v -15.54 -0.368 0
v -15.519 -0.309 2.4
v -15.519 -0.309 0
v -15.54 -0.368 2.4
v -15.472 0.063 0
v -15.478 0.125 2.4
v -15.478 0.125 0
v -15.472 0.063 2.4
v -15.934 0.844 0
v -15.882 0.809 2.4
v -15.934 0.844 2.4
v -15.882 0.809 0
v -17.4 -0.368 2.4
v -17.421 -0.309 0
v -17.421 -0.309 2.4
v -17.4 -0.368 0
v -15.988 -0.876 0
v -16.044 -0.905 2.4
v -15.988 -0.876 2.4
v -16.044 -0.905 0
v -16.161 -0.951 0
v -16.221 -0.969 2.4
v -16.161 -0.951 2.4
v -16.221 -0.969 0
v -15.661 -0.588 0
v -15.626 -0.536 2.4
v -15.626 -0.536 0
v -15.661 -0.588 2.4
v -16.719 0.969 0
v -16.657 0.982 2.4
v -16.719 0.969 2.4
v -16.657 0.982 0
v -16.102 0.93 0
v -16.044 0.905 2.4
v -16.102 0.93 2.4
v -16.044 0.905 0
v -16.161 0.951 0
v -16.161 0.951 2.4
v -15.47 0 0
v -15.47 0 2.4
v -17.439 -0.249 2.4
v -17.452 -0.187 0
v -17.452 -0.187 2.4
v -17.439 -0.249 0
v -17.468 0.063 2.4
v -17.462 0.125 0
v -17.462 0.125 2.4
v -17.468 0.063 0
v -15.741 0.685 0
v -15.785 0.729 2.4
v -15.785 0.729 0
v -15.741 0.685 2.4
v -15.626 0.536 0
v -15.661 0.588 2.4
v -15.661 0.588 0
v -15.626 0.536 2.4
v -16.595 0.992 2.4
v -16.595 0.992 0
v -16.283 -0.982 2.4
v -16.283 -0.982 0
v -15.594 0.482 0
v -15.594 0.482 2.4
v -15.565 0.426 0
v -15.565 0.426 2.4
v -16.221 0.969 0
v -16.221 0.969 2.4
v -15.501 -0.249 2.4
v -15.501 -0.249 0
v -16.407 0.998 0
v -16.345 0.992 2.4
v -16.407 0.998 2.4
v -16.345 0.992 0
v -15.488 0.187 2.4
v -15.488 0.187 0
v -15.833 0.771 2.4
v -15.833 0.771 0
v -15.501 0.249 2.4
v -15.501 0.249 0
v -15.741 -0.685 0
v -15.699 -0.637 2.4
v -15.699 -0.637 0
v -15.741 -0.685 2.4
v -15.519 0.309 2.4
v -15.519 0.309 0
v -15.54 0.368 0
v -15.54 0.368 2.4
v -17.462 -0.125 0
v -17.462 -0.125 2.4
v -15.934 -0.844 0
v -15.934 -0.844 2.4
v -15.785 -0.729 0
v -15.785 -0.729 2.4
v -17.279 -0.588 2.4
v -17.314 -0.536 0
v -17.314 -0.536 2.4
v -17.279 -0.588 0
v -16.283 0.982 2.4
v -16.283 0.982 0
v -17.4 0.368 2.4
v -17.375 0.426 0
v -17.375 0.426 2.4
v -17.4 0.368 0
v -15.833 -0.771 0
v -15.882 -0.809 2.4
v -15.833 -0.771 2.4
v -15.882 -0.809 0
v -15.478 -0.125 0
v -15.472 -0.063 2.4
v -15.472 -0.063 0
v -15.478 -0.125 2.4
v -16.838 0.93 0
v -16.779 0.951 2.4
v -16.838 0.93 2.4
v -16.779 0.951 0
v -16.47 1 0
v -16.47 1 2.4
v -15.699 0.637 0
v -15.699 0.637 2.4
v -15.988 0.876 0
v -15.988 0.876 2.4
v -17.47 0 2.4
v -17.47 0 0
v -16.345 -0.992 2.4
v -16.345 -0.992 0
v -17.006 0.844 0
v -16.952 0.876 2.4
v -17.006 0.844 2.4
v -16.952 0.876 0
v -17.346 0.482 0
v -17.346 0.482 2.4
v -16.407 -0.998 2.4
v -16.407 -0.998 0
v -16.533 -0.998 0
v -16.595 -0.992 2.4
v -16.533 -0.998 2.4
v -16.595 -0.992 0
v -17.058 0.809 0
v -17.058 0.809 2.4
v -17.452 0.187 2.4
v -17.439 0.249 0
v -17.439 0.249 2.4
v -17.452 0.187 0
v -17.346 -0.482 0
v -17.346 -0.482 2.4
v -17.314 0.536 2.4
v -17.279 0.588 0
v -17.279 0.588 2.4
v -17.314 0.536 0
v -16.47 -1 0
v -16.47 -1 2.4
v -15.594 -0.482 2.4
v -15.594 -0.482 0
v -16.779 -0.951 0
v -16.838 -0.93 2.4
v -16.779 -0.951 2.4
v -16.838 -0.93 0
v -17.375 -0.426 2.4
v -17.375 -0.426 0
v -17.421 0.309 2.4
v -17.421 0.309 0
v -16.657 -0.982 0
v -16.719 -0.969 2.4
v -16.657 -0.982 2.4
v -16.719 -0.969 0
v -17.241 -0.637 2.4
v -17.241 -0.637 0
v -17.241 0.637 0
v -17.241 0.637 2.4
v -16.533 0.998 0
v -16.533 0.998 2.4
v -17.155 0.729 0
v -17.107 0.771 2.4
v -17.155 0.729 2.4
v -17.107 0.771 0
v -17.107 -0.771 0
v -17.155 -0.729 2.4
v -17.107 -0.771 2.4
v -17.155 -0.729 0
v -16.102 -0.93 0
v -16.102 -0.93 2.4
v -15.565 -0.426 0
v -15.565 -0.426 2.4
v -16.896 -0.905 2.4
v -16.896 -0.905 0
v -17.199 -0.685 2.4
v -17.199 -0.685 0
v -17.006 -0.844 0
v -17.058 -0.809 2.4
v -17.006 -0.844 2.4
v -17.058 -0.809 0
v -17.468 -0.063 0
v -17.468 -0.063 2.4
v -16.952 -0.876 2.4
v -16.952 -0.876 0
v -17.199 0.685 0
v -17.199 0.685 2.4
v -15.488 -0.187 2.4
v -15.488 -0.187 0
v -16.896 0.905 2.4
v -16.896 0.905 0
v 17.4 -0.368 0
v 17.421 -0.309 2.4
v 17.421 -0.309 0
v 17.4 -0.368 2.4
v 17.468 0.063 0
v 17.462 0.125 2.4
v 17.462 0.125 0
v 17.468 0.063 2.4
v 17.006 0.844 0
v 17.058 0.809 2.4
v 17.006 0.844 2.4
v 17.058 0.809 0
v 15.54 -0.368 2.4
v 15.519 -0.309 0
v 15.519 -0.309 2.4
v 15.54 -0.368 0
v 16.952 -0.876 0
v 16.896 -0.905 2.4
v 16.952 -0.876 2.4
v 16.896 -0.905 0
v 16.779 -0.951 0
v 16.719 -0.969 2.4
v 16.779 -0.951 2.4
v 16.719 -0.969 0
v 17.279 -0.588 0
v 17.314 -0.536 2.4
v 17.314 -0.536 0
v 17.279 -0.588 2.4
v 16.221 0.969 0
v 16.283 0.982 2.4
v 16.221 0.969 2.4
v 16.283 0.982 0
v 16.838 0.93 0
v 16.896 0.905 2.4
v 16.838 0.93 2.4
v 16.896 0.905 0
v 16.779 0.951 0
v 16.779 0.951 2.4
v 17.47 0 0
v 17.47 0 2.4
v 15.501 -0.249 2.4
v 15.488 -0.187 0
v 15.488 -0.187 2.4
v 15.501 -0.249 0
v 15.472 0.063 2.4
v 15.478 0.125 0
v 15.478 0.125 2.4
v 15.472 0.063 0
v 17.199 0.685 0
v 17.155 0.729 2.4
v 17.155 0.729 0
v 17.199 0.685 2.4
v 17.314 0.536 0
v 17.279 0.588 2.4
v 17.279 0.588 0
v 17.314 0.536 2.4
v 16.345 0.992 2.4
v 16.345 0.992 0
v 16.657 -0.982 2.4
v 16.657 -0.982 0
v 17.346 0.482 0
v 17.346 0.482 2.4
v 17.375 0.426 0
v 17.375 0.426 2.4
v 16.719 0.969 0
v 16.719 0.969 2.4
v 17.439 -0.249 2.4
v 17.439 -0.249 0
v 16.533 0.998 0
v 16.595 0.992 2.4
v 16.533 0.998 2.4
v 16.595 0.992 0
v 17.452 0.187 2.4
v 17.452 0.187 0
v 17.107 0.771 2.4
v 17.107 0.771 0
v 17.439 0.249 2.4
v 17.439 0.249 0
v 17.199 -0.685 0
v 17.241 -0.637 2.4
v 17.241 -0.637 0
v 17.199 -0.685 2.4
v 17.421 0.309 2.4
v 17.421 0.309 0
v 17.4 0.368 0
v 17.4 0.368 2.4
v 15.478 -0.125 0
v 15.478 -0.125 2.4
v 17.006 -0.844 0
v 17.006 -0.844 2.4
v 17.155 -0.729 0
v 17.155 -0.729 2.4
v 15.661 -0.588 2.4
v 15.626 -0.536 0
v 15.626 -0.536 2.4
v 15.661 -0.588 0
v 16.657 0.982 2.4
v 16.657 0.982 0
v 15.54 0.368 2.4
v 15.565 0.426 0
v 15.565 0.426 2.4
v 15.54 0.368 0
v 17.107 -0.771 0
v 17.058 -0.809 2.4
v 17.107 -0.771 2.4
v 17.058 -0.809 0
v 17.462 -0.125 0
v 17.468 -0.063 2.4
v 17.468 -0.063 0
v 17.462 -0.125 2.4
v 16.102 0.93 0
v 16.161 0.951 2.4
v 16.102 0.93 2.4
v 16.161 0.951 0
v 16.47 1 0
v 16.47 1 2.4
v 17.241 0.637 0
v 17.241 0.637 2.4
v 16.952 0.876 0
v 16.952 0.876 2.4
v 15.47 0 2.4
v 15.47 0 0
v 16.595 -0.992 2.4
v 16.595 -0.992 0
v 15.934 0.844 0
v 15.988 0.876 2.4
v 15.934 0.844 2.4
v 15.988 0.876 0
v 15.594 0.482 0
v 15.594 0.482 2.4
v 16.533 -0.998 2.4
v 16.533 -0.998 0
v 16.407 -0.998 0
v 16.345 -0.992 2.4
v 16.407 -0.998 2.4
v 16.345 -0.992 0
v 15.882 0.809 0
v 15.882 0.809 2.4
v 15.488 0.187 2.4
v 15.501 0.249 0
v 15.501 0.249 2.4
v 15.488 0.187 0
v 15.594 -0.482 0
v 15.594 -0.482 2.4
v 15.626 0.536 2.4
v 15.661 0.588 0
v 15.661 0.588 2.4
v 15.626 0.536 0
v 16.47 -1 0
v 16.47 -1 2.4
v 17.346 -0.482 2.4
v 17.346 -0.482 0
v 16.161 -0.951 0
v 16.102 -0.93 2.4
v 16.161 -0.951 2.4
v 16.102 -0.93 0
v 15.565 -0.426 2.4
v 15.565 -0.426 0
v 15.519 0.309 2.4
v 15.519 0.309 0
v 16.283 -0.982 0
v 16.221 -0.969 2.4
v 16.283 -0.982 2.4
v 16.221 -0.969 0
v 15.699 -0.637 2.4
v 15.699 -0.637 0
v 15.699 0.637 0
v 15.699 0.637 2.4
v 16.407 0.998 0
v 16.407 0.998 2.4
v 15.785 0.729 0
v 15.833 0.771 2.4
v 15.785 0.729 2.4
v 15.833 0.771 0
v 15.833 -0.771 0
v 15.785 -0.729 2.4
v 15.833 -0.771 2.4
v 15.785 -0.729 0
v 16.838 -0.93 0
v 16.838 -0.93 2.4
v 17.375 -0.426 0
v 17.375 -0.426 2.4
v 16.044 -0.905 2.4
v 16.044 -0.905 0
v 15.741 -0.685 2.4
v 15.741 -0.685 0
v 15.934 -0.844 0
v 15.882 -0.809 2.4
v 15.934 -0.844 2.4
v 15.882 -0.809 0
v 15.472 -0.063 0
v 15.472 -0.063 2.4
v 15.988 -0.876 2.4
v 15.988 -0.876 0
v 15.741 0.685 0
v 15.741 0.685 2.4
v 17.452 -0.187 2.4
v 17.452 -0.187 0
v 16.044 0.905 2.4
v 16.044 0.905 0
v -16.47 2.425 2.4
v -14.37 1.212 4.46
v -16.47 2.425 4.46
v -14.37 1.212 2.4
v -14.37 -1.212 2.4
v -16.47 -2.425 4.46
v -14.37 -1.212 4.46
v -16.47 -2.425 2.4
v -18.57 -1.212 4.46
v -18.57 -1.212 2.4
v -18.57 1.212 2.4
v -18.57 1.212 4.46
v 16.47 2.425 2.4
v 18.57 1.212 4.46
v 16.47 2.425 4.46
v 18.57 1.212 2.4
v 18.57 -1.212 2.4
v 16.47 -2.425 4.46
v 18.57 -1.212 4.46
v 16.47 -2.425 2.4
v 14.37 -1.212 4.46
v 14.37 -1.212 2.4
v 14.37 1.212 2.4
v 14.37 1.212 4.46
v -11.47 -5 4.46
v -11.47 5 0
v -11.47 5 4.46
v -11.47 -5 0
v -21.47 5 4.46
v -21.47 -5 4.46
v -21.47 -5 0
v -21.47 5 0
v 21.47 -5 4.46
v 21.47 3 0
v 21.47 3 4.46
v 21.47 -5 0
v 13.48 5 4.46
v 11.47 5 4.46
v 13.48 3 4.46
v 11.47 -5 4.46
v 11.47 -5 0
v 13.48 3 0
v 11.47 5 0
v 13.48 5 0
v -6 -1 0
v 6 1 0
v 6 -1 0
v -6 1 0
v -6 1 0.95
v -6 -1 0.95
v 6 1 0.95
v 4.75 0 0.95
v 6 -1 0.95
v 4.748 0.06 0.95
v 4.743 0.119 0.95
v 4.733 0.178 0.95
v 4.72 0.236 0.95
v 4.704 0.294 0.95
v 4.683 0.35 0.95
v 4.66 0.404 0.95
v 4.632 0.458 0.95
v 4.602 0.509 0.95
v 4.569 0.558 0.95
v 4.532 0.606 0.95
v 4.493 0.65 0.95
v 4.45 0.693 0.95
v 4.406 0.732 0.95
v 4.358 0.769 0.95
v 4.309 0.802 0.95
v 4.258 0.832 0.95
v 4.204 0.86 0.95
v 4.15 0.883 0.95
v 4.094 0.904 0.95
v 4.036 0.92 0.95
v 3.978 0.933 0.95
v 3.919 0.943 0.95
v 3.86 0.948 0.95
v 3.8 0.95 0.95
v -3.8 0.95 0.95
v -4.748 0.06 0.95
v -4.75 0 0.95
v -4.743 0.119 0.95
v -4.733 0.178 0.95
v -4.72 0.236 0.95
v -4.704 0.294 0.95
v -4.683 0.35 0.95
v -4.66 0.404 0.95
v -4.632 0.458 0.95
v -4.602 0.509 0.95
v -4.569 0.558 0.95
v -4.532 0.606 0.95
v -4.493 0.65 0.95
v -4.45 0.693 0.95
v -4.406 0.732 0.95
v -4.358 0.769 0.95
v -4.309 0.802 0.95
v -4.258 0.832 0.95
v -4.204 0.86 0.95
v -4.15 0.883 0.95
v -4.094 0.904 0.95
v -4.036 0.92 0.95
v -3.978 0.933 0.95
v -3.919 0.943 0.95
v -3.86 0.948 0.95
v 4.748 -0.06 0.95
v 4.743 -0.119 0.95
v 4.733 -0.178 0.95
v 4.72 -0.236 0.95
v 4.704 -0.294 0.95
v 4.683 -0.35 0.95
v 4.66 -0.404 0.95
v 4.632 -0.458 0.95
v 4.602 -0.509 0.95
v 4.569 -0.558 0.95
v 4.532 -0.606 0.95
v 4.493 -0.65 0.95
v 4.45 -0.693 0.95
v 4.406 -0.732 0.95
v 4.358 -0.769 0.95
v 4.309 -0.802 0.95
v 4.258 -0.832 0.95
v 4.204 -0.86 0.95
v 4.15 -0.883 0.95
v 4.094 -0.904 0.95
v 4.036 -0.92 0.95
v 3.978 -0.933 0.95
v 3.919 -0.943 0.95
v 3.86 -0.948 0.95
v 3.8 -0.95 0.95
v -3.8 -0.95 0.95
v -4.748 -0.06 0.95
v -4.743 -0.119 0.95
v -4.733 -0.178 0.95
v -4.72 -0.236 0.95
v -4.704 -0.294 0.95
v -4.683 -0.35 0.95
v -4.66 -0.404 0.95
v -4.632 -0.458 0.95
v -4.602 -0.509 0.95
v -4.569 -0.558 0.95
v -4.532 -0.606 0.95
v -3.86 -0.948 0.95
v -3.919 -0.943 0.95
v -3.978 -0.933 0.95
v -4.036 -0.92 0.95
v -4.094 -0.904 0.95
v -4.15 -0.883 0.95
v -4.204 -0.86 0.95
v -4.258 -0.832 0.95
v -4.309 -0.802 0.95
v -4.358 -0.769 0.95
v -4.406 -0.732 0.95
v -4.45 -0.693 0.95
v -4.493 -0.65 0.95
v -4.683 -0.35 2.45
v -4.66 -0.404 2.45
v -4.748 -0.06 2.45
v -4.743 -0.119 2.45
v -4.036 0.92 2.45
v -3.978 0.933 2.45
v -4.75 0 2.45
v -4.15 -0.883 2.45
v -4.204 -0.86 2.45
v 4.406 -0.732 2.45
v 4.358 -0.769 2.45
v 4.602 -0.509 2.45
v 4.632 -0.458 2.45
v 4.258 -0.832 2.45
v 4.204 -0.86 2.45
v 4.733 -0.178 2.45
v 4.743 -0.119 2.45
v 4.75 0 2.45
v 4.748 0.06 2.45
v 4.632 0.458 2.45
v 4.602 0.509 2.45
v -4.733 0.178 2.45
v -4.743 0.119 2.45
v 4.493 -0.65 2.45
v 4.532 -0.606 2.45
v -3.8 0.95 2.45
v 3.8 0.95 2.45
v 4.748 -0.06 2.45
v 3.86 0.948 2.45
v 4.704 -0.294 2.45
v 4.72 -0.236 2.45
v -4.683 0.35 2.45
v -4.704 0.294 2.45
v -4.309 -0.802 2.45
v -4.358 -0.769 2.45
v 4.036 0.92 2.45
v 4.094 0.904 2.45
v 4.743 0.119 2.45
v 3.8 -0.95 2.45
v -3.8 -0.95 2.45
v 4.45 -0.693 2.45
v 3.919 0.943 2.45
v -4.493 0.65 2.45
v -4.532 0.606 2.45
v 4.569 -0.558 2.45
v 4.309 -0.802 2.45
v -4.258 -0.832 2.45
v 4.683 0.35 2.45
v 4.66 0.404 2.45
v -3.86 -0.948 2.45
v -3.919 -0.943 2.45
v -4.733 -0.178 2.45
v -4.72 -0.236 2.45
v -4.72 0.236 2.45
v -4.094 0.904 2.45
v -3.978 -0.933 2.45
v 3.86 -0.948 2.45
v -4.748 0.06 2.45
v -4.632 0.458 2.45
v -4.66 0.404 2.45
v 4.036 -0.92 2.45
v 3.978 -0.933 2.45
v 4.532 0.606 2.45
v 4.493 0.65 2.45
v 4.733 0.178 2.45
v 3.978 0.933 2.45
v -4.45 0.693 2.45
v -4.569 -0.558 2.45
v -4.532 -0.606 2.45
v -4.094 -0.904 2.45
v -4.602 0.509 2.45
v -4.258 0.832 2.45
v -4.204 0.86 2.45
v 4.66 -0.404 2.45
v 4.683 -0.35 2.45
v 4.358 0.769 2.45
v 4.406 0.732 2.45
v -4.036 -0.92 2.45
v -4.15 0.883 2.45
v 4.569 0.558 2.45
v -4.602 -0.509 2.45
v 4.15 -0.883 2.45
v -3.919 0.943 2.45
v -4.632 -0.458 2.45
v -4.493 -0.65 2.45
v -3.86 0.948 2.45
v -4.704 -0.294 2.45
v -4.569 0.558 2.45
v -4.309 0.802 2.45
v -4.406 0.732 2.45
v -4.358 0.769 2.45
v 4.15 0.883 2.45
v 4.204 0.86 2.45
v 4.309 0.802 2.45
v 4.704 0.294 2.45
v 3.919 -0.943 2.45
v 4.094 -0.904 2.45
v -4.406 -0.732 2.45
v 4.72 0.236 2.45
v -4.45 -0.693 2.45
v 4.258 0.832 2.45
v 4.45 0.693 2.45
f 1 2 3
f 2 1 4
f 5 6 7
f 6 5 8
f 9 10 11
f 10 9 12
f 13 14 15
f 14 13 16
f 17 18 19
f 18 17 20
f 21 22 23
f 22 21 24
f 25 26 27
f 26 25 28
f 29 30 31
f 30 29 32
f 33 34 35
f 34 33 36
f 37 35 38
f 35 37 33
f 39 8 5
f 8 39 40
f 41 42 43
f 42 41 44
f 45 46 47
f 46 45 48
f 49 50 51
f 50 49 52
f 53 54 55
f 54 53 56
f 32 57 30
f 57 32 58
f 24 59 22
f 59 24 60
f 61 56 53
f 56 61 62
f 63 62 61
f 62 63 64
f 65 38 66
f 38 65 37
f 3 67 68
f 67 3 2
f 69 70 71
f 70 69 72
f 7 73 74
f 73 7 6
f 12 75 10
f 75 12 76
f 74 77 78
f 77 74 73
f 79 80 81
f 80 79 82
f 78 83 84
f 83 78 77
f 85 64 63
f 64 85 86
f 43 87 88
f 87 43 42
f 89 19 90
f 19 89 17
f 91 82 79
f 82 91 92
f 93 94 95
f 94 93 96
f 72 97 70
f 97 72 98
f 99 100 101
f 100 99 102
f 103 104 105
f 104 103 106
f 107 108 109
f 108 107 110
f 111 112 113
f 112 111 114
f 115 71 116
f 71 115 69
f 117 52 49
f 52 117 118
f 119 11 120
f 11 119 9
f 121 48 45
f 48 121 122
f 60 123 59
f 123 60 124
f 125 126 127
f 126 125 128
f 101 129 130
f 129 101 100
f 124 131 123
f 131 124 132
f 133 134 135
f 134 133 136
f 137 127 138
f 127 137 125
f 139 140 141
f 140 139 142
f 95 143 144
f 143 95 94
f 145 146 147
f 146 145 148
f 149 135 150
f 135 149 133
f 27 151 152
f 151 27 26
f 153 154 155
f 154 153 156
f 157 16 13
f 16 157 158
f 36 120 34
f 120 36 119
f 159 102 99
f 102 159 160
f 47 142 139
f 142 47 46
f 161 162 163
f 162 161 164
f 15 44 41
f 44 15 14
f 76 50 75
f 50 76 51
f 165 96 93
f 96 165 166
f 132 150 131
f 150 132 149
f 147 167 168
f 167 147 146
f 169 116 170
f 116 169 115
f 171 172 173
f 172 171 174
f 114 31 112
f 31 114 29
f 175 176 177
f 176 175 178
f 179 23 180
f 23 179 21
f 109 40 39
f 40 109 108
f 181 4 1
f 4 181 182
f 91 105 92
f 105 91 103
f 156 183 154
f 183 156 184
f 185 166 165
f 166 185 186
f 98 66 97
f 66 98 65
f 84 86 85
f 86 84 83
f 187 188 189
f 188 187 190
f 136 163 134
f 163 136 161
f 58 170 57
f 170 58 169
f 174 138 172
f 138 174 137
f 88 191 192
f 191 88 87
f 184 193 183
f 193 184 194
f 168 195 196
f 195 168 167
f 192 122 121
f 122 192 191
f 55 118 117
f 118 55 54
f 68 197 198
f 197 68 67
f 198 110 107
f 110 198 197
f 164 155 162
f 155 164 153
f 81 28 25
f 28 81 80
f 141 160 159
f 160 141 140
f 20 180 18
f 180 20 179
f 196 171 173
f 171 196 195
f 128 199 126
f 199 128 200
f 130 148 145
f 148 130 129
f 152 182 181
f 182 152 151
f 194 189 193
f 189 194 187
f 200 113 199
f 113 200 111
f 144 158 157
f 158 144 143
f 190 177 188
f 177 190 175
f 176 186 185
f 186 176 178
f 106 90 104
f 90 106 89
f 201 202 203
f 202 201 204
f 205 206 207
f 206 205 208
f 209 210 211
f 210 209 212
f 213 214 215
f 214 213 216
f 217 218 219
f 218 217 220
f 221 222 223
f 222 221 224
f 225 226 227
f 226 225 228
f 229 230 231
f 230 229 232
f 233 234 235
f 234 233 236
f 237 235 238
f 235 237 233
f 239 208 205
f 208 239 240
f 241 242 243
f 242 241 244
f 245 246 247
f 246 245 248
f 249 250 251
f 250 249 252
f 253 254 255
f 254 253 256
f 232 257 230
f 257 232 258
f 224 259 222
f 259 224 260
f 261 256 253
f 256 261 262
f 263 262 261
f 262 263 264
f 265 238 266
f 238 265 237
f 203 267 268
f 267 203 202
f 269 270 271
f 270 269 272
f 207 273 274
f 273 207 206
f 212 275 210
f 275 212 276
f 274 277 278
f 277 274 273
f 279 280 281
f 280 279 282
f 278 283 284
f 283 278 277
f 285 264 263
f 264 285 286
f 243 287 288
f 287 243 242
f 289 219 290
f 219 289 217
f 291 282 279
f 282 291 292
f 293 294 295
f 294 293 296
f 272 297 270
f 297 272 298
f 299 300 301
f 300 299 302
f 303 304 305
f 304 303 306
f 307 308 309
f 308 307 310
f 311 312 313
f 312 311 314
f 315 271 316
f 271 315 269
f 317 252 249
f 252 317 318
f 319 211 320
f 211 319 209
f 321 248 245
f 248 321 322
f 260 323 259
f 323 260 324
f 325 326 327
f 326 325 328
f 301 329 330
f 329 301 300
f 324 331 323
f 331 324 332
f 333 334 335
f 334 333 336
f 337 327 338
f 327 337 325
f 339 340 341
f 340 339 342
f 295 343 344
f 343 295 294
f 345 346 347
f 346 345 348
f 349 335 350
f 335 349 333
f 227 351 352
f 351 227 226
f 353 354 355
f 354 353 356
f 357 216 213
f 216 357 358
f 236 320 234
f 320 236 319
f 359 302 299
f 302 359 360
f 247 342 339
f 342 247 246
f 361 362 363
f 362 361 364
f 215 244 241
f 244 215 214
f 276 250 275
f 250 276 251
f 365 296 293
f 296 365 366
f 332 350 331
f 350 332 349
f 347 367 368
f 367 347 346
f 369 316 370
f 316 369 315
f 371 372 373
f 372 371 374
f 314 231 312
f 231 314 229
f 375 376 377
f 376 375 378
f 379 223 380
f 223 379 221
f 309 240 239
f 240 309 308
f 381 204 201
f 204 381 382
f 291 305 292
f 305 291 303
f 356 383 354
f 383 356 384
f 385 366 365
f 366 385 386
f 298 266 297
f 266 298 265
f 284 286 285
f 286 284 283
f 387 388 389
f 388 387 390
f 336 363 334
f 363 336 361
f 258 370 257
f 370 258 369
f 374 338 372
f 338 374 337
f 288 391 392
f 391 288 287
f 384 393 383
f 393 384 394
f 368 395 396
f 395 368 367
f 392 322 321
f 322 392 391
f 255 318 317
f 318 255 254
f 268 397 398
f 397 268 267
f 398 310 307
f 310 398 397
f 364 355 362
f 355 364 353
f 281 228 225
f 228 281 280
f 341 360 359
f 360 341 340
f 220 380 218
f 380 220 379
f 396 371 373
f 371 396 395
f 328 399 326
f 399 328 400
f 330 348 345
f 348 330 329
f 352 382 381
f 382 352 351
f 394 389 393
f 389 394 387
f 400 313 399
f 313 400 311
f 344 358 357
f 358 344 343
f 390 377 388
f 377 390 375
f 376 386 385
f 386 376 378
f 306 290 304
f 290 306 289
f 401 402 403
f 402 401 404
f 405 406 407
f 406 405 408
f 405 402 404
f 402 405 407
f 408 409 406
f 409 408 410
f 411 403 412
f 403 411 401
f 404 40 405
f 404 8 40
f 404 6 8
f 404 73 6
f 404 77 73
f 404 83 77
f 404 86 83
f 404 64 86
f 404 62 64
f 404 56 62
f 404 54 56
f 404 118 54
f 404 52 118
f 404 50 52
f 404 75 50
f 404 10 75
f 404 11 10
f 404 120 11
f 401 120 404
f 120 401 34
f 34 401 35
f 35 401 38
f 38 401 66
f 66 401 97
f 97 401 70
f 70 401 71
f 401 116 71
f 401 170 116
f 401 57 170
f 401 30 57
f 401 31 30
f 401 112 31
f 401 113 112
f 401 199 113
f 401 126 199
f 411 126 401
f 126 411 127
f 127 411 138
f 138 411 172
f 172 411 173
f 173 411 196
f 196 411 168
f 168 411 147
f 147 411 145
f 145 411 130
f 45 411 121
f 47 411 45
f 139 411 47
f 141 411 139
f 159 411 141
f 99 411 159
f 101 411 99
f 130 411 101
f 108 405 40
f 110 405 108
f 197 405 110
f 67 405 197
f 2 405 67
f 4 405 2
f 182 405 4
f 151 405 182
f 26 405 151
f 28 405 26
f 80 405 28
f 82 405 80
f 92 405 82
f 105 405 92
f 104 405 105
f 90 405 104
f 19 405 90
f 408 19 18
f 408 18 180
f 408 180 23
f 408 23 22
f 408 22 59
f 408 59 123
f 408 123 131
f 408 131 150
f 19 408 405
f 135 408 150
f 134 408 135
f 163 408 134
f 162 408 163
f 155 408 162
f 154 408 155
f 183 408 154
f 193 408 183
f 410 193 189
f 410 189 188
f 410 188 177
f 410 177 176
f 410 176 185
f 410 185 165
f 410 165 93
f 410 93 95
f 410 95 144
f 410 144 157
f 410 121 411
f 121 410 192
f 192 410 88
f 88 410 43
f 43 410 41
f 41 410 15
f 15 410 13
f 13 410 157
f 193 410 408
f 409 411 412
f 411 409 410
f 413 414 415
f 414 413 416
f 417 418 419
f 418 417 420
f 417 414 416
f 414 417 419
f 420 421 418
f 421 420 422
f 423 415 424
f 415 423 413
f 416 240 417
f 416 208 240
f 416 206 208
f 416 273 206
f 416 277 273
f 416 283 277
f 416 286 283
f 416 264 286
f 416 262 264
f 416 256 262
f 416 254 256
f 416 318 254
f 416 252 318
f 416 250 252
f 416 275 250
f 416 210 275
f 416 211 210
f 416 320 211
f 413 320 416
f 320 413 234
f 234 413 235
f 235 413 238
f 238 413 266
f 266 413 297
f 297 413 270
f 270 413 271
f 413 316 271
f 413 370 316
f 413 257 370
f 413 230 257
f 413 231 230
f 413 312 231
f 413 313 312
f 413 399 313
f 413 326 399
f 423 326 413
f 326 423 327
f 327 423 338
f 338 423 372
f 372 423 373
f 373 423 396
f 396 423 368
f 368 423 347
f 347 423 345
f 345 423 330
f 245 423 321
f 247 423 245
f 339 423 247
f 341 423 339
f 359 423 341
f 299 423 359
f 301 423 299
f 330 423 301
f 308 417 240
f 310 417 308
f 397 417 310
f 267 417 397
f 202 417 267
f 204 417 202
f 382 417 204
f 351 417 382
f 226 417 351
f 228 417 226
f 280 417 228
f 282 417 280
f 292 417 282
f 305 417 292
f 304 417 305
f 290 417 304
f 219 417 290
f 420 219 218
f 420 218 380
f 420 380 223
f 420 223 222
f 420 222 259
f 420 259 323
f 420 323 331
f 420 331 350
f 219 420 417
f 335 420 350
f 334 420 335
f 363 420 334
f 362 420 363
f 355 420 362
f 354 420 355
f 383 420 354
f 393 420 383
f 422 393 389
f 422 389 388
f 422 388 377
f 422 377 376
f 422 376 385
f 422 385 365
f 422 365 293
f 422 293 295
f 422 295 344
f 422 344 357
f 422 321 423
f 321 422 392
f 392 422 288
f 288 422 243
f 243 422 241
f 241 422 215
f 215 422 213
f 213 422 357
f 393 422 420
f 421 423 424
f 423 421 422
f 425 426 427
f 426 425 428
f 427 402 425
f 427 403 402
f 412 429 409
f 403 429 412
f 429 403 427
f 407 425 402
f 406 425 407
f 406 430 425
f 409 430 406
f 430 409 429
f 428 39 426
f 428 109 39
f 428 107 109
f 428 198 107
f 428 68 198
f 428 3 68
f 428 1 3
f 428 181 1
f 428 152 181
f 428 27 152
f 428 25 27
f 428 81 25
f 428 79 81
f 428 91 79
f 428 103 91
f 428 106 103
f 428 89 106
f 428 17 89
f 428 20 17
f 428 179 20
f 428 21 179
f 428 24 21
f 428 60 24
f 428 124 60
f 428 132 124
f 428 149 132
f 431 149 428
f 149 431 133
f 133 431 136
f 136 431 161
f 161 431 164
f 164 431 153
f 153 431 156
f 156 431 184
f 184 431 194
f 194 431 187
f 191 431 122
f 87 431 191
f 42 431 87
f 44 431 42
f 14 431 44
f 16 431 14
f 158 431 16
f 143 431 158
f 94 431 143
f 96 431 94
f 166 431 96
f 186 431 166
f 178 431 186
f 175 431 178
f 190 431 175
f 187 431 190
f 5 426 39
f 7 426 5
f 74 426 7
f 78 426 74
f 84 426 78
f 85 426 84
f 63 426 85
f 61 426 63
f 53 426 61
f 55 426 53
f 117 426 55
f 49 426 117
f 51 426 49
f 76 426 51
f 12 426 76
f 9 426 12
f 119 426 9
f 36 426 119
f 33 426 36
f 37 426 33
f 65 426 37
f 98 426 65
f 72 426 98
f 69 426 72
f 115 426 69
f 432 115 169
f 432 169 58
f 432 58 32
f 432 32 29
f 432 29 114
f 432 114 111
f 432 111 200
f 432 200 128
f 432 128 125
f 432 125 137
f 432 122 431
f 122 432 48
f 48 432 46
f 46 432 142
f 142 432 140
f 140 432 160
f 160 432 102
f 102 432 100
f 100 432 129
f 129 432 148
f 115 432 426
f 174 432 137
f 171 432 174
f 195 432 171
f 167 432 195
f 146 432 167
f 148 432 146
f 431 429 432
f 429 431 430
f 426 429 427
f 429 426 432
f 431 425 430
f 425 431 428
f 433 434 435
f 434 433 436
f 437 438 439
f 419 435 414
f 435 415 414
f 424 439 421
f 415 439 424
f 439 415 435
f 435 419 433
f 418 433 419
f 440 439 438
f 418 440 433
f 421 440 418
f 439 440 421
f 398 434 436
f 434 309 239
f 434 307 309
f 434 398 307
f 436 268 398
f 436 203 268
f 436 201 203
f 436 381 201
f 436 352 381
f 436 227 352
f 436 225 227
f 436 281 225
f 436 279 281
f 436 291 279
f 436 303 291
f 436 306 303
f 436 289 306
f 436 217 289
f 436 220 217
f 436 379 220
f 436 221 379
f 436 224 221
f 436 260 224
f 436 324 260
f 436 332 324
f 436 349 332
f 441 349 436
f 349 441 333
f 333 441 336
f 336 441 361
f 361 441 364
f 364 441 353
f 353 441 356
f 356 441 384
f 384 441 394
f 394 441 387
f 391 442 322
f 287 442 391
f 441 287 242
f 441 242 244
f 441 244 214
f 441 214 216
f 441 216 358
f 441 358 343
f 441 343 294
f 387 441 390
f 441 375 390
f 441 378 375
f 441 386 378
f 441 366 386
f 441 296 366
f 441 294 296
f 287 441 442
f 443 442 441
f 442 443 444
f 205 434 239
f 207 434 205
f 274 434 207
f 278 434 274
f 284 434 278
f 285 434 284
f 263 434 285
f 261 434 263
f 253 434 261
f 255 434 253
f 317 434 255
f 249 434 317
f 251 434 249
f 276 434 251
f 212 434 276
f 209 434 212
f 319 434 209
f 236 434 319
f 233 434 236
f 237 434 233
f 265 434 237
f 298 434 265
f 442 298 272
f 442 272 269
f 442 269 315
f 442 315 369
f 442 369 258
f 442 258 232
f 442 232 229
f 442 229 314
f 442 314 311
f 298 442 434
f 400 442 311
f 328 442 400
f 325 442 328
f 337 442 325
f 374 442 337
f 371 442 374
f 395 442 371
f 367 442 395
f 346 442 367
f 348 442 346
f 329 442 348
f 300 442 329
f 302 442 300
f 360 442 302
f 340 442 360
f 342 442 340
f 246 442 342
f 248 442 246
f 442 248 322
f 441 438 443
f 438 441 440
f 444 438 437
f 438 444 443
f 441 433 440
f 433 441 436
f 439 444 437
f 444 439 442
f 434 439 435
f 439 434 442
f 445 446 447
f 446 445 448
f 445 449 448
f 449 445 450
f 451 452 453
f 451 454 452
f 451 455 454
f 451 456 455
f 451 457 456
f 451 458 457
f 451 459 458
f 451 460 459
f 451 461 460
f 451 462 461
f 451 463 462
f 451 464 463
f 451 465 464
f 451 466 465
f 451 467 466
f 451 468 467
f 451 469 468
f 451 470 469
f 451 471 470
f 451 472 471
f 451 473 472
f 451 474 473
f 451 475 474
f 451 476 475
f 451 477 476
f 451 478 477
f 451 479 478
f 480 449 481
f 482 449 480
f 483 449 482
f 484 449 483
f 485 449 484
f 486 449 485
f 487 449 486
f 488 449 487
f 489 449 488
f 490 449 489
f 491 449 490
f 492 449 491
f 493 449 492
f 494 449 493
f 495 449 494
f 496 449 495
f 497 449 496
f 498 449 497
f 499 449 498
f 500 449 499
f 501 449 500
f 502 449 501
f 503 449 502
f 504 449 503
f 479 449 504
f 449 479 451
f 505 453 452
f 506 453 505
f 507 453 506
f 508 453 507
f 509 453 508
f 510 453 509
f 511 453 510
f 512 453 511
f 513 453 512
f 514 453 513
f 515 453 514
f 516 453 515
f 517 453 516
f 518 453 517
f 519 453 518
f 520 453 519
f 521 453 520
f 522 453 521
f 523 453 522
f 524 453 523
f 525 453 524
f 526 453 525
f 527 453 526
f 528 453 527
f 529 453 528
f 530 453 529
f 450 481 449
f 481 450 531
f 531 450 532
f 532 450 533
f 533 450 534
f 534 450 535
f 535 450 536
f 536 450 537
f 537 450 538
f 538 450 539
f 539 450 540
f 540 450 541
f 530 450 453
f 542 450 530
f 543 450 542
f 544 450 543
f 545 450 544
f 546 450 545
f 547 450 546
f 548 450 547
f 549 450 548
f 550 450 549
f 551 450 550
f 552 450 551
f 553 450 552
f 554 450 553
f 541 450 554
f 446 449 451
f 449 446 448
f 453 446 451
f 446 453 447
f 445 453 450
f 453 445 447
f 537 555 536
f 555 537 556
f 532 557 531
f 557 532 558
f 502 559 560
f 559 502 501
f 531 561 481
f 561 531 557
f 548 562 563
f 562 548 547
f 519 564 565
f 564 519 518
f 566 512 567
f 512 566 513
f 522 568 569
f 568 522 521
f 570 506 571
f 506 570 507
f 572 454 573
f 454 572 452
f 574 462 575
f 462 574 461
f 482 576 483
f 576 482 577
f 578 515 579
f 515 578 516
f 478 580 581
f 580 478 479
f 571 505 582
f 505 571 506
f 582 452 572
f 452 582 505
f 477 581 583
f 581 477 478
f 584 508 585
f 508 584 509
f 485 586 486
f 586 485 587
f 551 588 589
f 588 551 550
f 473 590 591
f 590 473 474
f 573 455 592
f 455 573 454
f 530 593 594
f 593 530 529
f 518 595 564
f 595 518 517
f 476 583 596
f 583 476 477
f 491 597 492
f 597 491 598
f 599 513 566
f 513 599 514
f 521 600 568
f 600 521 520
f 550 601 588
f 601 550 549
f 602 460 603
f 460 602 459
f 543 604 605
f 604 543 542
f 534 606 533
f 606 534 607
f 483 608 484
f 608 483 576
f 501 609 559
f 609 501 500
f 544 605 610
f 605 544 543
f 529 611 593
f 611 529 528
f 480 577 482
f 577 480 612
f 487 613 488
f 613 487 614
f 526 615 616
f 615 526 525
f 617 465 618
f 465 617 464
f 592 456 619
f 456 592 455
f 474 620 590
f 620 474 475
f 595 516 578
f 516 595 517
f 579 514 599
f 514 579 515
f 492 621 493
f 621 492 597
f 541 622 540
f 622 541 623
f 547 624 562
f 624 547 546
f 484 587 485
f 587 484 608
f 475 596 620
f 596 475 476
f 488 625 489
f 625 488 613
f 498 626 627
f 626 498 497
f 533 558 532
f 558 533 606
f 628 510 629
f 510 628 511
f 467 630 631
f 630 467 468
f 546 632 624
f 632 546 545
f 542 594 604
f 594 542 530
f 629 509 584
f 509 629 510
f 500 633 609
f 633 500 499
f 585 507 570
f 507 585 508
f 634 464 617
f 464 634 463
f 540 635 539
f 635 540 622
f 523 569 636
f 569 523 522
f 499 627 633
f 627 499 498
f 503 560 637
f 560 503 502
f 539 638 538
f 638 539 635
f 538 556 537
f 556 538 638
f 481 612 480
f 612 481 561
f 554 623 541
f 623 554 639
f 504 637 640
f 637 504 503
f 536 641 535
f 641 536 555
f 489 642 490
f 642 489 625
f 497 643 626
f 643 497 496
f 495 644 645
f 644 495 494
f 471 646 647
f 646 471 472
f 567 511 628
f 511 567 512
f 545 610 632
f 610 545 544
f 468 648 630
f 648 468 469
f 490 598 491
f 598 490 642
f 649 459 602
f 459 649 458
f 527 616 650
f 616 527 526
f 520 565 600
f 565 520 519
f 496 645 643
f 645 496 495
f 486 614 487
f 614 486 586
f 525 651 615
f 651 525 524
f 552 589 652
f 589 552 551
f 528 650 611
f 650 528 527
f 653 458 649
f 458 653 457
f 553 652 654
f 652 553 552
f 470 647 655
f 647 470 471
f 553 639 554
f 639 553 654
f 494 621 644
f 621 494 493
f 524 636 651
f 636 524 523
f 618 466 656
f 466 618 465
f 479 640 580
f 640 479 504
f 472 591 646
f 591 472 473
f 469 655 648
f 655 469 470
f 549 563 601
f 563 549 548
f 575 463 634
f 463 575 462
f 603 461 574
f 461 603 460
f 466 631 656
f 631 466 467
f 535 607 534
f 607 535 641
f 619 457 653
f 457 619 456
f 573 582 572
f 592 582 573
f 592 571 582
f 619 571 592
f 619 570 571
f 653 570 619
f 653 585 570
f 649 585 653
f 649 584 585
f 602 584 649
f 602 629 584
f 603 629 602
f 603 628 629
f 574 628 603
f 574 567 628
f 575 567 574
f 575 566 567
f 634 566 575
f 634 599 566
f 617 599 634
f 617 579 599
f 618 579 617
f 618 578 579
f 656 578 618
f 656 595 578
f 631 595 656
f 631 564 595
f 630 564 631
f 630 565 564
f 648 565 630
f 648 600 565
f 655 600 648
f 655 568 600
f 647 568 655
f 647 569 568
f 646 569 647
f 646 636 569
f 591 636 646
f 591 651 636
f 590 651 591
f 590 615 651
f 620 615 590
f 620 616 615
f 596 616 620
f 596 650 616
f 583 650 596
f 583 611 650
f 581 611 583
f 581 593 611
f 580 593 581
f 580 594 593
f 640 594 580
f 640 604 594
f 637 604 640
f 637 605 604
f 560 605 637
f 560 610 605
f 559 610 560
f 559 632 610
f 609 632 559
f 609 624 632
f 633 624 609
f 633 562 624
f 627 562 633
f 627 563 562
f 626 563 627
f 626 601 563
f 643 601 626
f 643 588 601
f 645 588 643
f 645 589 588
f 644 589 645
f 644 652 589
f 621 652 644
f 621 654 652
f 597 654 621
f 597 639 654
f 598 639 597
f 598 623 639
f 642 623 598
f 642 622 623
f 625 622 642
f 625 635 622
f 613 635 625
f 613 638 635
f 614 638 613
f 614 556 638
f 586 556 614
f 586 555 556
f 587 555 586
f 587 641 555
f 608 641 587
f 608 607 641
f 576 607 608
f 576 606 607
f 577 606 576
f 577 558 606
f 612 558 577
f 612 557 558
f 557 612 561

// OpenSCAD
/*
* Copyright 2014 Jonas Hagmar
*
* This file is part of keynjector.
*
* keynjector is free software: you can redistribute it and/or modify
* it under the terms of the GNU General Public License as published by
* the Free Software Foundation, either version 2 of the License, or
* (at your option) any later version.
*
* keynjector is distributed in the hope that it will be useful,
* but WITHOUT ANY WARRANTY; without even the implied warranty of
* MERCHANTABILITY or FITNESS FOR A PARTICULAR PURPOSE.  See the
* GNU General Public License for more details.
*
* You should have received a copy of the GNU General Public License
* along with keynjector.  If not, see <http://www.gnu.org/licenses/>.
*/

use <keynjector-case.scad>;

/***** Renders *****/

$fn=100;

holder_dbg_normalized();

btn_normalized();
